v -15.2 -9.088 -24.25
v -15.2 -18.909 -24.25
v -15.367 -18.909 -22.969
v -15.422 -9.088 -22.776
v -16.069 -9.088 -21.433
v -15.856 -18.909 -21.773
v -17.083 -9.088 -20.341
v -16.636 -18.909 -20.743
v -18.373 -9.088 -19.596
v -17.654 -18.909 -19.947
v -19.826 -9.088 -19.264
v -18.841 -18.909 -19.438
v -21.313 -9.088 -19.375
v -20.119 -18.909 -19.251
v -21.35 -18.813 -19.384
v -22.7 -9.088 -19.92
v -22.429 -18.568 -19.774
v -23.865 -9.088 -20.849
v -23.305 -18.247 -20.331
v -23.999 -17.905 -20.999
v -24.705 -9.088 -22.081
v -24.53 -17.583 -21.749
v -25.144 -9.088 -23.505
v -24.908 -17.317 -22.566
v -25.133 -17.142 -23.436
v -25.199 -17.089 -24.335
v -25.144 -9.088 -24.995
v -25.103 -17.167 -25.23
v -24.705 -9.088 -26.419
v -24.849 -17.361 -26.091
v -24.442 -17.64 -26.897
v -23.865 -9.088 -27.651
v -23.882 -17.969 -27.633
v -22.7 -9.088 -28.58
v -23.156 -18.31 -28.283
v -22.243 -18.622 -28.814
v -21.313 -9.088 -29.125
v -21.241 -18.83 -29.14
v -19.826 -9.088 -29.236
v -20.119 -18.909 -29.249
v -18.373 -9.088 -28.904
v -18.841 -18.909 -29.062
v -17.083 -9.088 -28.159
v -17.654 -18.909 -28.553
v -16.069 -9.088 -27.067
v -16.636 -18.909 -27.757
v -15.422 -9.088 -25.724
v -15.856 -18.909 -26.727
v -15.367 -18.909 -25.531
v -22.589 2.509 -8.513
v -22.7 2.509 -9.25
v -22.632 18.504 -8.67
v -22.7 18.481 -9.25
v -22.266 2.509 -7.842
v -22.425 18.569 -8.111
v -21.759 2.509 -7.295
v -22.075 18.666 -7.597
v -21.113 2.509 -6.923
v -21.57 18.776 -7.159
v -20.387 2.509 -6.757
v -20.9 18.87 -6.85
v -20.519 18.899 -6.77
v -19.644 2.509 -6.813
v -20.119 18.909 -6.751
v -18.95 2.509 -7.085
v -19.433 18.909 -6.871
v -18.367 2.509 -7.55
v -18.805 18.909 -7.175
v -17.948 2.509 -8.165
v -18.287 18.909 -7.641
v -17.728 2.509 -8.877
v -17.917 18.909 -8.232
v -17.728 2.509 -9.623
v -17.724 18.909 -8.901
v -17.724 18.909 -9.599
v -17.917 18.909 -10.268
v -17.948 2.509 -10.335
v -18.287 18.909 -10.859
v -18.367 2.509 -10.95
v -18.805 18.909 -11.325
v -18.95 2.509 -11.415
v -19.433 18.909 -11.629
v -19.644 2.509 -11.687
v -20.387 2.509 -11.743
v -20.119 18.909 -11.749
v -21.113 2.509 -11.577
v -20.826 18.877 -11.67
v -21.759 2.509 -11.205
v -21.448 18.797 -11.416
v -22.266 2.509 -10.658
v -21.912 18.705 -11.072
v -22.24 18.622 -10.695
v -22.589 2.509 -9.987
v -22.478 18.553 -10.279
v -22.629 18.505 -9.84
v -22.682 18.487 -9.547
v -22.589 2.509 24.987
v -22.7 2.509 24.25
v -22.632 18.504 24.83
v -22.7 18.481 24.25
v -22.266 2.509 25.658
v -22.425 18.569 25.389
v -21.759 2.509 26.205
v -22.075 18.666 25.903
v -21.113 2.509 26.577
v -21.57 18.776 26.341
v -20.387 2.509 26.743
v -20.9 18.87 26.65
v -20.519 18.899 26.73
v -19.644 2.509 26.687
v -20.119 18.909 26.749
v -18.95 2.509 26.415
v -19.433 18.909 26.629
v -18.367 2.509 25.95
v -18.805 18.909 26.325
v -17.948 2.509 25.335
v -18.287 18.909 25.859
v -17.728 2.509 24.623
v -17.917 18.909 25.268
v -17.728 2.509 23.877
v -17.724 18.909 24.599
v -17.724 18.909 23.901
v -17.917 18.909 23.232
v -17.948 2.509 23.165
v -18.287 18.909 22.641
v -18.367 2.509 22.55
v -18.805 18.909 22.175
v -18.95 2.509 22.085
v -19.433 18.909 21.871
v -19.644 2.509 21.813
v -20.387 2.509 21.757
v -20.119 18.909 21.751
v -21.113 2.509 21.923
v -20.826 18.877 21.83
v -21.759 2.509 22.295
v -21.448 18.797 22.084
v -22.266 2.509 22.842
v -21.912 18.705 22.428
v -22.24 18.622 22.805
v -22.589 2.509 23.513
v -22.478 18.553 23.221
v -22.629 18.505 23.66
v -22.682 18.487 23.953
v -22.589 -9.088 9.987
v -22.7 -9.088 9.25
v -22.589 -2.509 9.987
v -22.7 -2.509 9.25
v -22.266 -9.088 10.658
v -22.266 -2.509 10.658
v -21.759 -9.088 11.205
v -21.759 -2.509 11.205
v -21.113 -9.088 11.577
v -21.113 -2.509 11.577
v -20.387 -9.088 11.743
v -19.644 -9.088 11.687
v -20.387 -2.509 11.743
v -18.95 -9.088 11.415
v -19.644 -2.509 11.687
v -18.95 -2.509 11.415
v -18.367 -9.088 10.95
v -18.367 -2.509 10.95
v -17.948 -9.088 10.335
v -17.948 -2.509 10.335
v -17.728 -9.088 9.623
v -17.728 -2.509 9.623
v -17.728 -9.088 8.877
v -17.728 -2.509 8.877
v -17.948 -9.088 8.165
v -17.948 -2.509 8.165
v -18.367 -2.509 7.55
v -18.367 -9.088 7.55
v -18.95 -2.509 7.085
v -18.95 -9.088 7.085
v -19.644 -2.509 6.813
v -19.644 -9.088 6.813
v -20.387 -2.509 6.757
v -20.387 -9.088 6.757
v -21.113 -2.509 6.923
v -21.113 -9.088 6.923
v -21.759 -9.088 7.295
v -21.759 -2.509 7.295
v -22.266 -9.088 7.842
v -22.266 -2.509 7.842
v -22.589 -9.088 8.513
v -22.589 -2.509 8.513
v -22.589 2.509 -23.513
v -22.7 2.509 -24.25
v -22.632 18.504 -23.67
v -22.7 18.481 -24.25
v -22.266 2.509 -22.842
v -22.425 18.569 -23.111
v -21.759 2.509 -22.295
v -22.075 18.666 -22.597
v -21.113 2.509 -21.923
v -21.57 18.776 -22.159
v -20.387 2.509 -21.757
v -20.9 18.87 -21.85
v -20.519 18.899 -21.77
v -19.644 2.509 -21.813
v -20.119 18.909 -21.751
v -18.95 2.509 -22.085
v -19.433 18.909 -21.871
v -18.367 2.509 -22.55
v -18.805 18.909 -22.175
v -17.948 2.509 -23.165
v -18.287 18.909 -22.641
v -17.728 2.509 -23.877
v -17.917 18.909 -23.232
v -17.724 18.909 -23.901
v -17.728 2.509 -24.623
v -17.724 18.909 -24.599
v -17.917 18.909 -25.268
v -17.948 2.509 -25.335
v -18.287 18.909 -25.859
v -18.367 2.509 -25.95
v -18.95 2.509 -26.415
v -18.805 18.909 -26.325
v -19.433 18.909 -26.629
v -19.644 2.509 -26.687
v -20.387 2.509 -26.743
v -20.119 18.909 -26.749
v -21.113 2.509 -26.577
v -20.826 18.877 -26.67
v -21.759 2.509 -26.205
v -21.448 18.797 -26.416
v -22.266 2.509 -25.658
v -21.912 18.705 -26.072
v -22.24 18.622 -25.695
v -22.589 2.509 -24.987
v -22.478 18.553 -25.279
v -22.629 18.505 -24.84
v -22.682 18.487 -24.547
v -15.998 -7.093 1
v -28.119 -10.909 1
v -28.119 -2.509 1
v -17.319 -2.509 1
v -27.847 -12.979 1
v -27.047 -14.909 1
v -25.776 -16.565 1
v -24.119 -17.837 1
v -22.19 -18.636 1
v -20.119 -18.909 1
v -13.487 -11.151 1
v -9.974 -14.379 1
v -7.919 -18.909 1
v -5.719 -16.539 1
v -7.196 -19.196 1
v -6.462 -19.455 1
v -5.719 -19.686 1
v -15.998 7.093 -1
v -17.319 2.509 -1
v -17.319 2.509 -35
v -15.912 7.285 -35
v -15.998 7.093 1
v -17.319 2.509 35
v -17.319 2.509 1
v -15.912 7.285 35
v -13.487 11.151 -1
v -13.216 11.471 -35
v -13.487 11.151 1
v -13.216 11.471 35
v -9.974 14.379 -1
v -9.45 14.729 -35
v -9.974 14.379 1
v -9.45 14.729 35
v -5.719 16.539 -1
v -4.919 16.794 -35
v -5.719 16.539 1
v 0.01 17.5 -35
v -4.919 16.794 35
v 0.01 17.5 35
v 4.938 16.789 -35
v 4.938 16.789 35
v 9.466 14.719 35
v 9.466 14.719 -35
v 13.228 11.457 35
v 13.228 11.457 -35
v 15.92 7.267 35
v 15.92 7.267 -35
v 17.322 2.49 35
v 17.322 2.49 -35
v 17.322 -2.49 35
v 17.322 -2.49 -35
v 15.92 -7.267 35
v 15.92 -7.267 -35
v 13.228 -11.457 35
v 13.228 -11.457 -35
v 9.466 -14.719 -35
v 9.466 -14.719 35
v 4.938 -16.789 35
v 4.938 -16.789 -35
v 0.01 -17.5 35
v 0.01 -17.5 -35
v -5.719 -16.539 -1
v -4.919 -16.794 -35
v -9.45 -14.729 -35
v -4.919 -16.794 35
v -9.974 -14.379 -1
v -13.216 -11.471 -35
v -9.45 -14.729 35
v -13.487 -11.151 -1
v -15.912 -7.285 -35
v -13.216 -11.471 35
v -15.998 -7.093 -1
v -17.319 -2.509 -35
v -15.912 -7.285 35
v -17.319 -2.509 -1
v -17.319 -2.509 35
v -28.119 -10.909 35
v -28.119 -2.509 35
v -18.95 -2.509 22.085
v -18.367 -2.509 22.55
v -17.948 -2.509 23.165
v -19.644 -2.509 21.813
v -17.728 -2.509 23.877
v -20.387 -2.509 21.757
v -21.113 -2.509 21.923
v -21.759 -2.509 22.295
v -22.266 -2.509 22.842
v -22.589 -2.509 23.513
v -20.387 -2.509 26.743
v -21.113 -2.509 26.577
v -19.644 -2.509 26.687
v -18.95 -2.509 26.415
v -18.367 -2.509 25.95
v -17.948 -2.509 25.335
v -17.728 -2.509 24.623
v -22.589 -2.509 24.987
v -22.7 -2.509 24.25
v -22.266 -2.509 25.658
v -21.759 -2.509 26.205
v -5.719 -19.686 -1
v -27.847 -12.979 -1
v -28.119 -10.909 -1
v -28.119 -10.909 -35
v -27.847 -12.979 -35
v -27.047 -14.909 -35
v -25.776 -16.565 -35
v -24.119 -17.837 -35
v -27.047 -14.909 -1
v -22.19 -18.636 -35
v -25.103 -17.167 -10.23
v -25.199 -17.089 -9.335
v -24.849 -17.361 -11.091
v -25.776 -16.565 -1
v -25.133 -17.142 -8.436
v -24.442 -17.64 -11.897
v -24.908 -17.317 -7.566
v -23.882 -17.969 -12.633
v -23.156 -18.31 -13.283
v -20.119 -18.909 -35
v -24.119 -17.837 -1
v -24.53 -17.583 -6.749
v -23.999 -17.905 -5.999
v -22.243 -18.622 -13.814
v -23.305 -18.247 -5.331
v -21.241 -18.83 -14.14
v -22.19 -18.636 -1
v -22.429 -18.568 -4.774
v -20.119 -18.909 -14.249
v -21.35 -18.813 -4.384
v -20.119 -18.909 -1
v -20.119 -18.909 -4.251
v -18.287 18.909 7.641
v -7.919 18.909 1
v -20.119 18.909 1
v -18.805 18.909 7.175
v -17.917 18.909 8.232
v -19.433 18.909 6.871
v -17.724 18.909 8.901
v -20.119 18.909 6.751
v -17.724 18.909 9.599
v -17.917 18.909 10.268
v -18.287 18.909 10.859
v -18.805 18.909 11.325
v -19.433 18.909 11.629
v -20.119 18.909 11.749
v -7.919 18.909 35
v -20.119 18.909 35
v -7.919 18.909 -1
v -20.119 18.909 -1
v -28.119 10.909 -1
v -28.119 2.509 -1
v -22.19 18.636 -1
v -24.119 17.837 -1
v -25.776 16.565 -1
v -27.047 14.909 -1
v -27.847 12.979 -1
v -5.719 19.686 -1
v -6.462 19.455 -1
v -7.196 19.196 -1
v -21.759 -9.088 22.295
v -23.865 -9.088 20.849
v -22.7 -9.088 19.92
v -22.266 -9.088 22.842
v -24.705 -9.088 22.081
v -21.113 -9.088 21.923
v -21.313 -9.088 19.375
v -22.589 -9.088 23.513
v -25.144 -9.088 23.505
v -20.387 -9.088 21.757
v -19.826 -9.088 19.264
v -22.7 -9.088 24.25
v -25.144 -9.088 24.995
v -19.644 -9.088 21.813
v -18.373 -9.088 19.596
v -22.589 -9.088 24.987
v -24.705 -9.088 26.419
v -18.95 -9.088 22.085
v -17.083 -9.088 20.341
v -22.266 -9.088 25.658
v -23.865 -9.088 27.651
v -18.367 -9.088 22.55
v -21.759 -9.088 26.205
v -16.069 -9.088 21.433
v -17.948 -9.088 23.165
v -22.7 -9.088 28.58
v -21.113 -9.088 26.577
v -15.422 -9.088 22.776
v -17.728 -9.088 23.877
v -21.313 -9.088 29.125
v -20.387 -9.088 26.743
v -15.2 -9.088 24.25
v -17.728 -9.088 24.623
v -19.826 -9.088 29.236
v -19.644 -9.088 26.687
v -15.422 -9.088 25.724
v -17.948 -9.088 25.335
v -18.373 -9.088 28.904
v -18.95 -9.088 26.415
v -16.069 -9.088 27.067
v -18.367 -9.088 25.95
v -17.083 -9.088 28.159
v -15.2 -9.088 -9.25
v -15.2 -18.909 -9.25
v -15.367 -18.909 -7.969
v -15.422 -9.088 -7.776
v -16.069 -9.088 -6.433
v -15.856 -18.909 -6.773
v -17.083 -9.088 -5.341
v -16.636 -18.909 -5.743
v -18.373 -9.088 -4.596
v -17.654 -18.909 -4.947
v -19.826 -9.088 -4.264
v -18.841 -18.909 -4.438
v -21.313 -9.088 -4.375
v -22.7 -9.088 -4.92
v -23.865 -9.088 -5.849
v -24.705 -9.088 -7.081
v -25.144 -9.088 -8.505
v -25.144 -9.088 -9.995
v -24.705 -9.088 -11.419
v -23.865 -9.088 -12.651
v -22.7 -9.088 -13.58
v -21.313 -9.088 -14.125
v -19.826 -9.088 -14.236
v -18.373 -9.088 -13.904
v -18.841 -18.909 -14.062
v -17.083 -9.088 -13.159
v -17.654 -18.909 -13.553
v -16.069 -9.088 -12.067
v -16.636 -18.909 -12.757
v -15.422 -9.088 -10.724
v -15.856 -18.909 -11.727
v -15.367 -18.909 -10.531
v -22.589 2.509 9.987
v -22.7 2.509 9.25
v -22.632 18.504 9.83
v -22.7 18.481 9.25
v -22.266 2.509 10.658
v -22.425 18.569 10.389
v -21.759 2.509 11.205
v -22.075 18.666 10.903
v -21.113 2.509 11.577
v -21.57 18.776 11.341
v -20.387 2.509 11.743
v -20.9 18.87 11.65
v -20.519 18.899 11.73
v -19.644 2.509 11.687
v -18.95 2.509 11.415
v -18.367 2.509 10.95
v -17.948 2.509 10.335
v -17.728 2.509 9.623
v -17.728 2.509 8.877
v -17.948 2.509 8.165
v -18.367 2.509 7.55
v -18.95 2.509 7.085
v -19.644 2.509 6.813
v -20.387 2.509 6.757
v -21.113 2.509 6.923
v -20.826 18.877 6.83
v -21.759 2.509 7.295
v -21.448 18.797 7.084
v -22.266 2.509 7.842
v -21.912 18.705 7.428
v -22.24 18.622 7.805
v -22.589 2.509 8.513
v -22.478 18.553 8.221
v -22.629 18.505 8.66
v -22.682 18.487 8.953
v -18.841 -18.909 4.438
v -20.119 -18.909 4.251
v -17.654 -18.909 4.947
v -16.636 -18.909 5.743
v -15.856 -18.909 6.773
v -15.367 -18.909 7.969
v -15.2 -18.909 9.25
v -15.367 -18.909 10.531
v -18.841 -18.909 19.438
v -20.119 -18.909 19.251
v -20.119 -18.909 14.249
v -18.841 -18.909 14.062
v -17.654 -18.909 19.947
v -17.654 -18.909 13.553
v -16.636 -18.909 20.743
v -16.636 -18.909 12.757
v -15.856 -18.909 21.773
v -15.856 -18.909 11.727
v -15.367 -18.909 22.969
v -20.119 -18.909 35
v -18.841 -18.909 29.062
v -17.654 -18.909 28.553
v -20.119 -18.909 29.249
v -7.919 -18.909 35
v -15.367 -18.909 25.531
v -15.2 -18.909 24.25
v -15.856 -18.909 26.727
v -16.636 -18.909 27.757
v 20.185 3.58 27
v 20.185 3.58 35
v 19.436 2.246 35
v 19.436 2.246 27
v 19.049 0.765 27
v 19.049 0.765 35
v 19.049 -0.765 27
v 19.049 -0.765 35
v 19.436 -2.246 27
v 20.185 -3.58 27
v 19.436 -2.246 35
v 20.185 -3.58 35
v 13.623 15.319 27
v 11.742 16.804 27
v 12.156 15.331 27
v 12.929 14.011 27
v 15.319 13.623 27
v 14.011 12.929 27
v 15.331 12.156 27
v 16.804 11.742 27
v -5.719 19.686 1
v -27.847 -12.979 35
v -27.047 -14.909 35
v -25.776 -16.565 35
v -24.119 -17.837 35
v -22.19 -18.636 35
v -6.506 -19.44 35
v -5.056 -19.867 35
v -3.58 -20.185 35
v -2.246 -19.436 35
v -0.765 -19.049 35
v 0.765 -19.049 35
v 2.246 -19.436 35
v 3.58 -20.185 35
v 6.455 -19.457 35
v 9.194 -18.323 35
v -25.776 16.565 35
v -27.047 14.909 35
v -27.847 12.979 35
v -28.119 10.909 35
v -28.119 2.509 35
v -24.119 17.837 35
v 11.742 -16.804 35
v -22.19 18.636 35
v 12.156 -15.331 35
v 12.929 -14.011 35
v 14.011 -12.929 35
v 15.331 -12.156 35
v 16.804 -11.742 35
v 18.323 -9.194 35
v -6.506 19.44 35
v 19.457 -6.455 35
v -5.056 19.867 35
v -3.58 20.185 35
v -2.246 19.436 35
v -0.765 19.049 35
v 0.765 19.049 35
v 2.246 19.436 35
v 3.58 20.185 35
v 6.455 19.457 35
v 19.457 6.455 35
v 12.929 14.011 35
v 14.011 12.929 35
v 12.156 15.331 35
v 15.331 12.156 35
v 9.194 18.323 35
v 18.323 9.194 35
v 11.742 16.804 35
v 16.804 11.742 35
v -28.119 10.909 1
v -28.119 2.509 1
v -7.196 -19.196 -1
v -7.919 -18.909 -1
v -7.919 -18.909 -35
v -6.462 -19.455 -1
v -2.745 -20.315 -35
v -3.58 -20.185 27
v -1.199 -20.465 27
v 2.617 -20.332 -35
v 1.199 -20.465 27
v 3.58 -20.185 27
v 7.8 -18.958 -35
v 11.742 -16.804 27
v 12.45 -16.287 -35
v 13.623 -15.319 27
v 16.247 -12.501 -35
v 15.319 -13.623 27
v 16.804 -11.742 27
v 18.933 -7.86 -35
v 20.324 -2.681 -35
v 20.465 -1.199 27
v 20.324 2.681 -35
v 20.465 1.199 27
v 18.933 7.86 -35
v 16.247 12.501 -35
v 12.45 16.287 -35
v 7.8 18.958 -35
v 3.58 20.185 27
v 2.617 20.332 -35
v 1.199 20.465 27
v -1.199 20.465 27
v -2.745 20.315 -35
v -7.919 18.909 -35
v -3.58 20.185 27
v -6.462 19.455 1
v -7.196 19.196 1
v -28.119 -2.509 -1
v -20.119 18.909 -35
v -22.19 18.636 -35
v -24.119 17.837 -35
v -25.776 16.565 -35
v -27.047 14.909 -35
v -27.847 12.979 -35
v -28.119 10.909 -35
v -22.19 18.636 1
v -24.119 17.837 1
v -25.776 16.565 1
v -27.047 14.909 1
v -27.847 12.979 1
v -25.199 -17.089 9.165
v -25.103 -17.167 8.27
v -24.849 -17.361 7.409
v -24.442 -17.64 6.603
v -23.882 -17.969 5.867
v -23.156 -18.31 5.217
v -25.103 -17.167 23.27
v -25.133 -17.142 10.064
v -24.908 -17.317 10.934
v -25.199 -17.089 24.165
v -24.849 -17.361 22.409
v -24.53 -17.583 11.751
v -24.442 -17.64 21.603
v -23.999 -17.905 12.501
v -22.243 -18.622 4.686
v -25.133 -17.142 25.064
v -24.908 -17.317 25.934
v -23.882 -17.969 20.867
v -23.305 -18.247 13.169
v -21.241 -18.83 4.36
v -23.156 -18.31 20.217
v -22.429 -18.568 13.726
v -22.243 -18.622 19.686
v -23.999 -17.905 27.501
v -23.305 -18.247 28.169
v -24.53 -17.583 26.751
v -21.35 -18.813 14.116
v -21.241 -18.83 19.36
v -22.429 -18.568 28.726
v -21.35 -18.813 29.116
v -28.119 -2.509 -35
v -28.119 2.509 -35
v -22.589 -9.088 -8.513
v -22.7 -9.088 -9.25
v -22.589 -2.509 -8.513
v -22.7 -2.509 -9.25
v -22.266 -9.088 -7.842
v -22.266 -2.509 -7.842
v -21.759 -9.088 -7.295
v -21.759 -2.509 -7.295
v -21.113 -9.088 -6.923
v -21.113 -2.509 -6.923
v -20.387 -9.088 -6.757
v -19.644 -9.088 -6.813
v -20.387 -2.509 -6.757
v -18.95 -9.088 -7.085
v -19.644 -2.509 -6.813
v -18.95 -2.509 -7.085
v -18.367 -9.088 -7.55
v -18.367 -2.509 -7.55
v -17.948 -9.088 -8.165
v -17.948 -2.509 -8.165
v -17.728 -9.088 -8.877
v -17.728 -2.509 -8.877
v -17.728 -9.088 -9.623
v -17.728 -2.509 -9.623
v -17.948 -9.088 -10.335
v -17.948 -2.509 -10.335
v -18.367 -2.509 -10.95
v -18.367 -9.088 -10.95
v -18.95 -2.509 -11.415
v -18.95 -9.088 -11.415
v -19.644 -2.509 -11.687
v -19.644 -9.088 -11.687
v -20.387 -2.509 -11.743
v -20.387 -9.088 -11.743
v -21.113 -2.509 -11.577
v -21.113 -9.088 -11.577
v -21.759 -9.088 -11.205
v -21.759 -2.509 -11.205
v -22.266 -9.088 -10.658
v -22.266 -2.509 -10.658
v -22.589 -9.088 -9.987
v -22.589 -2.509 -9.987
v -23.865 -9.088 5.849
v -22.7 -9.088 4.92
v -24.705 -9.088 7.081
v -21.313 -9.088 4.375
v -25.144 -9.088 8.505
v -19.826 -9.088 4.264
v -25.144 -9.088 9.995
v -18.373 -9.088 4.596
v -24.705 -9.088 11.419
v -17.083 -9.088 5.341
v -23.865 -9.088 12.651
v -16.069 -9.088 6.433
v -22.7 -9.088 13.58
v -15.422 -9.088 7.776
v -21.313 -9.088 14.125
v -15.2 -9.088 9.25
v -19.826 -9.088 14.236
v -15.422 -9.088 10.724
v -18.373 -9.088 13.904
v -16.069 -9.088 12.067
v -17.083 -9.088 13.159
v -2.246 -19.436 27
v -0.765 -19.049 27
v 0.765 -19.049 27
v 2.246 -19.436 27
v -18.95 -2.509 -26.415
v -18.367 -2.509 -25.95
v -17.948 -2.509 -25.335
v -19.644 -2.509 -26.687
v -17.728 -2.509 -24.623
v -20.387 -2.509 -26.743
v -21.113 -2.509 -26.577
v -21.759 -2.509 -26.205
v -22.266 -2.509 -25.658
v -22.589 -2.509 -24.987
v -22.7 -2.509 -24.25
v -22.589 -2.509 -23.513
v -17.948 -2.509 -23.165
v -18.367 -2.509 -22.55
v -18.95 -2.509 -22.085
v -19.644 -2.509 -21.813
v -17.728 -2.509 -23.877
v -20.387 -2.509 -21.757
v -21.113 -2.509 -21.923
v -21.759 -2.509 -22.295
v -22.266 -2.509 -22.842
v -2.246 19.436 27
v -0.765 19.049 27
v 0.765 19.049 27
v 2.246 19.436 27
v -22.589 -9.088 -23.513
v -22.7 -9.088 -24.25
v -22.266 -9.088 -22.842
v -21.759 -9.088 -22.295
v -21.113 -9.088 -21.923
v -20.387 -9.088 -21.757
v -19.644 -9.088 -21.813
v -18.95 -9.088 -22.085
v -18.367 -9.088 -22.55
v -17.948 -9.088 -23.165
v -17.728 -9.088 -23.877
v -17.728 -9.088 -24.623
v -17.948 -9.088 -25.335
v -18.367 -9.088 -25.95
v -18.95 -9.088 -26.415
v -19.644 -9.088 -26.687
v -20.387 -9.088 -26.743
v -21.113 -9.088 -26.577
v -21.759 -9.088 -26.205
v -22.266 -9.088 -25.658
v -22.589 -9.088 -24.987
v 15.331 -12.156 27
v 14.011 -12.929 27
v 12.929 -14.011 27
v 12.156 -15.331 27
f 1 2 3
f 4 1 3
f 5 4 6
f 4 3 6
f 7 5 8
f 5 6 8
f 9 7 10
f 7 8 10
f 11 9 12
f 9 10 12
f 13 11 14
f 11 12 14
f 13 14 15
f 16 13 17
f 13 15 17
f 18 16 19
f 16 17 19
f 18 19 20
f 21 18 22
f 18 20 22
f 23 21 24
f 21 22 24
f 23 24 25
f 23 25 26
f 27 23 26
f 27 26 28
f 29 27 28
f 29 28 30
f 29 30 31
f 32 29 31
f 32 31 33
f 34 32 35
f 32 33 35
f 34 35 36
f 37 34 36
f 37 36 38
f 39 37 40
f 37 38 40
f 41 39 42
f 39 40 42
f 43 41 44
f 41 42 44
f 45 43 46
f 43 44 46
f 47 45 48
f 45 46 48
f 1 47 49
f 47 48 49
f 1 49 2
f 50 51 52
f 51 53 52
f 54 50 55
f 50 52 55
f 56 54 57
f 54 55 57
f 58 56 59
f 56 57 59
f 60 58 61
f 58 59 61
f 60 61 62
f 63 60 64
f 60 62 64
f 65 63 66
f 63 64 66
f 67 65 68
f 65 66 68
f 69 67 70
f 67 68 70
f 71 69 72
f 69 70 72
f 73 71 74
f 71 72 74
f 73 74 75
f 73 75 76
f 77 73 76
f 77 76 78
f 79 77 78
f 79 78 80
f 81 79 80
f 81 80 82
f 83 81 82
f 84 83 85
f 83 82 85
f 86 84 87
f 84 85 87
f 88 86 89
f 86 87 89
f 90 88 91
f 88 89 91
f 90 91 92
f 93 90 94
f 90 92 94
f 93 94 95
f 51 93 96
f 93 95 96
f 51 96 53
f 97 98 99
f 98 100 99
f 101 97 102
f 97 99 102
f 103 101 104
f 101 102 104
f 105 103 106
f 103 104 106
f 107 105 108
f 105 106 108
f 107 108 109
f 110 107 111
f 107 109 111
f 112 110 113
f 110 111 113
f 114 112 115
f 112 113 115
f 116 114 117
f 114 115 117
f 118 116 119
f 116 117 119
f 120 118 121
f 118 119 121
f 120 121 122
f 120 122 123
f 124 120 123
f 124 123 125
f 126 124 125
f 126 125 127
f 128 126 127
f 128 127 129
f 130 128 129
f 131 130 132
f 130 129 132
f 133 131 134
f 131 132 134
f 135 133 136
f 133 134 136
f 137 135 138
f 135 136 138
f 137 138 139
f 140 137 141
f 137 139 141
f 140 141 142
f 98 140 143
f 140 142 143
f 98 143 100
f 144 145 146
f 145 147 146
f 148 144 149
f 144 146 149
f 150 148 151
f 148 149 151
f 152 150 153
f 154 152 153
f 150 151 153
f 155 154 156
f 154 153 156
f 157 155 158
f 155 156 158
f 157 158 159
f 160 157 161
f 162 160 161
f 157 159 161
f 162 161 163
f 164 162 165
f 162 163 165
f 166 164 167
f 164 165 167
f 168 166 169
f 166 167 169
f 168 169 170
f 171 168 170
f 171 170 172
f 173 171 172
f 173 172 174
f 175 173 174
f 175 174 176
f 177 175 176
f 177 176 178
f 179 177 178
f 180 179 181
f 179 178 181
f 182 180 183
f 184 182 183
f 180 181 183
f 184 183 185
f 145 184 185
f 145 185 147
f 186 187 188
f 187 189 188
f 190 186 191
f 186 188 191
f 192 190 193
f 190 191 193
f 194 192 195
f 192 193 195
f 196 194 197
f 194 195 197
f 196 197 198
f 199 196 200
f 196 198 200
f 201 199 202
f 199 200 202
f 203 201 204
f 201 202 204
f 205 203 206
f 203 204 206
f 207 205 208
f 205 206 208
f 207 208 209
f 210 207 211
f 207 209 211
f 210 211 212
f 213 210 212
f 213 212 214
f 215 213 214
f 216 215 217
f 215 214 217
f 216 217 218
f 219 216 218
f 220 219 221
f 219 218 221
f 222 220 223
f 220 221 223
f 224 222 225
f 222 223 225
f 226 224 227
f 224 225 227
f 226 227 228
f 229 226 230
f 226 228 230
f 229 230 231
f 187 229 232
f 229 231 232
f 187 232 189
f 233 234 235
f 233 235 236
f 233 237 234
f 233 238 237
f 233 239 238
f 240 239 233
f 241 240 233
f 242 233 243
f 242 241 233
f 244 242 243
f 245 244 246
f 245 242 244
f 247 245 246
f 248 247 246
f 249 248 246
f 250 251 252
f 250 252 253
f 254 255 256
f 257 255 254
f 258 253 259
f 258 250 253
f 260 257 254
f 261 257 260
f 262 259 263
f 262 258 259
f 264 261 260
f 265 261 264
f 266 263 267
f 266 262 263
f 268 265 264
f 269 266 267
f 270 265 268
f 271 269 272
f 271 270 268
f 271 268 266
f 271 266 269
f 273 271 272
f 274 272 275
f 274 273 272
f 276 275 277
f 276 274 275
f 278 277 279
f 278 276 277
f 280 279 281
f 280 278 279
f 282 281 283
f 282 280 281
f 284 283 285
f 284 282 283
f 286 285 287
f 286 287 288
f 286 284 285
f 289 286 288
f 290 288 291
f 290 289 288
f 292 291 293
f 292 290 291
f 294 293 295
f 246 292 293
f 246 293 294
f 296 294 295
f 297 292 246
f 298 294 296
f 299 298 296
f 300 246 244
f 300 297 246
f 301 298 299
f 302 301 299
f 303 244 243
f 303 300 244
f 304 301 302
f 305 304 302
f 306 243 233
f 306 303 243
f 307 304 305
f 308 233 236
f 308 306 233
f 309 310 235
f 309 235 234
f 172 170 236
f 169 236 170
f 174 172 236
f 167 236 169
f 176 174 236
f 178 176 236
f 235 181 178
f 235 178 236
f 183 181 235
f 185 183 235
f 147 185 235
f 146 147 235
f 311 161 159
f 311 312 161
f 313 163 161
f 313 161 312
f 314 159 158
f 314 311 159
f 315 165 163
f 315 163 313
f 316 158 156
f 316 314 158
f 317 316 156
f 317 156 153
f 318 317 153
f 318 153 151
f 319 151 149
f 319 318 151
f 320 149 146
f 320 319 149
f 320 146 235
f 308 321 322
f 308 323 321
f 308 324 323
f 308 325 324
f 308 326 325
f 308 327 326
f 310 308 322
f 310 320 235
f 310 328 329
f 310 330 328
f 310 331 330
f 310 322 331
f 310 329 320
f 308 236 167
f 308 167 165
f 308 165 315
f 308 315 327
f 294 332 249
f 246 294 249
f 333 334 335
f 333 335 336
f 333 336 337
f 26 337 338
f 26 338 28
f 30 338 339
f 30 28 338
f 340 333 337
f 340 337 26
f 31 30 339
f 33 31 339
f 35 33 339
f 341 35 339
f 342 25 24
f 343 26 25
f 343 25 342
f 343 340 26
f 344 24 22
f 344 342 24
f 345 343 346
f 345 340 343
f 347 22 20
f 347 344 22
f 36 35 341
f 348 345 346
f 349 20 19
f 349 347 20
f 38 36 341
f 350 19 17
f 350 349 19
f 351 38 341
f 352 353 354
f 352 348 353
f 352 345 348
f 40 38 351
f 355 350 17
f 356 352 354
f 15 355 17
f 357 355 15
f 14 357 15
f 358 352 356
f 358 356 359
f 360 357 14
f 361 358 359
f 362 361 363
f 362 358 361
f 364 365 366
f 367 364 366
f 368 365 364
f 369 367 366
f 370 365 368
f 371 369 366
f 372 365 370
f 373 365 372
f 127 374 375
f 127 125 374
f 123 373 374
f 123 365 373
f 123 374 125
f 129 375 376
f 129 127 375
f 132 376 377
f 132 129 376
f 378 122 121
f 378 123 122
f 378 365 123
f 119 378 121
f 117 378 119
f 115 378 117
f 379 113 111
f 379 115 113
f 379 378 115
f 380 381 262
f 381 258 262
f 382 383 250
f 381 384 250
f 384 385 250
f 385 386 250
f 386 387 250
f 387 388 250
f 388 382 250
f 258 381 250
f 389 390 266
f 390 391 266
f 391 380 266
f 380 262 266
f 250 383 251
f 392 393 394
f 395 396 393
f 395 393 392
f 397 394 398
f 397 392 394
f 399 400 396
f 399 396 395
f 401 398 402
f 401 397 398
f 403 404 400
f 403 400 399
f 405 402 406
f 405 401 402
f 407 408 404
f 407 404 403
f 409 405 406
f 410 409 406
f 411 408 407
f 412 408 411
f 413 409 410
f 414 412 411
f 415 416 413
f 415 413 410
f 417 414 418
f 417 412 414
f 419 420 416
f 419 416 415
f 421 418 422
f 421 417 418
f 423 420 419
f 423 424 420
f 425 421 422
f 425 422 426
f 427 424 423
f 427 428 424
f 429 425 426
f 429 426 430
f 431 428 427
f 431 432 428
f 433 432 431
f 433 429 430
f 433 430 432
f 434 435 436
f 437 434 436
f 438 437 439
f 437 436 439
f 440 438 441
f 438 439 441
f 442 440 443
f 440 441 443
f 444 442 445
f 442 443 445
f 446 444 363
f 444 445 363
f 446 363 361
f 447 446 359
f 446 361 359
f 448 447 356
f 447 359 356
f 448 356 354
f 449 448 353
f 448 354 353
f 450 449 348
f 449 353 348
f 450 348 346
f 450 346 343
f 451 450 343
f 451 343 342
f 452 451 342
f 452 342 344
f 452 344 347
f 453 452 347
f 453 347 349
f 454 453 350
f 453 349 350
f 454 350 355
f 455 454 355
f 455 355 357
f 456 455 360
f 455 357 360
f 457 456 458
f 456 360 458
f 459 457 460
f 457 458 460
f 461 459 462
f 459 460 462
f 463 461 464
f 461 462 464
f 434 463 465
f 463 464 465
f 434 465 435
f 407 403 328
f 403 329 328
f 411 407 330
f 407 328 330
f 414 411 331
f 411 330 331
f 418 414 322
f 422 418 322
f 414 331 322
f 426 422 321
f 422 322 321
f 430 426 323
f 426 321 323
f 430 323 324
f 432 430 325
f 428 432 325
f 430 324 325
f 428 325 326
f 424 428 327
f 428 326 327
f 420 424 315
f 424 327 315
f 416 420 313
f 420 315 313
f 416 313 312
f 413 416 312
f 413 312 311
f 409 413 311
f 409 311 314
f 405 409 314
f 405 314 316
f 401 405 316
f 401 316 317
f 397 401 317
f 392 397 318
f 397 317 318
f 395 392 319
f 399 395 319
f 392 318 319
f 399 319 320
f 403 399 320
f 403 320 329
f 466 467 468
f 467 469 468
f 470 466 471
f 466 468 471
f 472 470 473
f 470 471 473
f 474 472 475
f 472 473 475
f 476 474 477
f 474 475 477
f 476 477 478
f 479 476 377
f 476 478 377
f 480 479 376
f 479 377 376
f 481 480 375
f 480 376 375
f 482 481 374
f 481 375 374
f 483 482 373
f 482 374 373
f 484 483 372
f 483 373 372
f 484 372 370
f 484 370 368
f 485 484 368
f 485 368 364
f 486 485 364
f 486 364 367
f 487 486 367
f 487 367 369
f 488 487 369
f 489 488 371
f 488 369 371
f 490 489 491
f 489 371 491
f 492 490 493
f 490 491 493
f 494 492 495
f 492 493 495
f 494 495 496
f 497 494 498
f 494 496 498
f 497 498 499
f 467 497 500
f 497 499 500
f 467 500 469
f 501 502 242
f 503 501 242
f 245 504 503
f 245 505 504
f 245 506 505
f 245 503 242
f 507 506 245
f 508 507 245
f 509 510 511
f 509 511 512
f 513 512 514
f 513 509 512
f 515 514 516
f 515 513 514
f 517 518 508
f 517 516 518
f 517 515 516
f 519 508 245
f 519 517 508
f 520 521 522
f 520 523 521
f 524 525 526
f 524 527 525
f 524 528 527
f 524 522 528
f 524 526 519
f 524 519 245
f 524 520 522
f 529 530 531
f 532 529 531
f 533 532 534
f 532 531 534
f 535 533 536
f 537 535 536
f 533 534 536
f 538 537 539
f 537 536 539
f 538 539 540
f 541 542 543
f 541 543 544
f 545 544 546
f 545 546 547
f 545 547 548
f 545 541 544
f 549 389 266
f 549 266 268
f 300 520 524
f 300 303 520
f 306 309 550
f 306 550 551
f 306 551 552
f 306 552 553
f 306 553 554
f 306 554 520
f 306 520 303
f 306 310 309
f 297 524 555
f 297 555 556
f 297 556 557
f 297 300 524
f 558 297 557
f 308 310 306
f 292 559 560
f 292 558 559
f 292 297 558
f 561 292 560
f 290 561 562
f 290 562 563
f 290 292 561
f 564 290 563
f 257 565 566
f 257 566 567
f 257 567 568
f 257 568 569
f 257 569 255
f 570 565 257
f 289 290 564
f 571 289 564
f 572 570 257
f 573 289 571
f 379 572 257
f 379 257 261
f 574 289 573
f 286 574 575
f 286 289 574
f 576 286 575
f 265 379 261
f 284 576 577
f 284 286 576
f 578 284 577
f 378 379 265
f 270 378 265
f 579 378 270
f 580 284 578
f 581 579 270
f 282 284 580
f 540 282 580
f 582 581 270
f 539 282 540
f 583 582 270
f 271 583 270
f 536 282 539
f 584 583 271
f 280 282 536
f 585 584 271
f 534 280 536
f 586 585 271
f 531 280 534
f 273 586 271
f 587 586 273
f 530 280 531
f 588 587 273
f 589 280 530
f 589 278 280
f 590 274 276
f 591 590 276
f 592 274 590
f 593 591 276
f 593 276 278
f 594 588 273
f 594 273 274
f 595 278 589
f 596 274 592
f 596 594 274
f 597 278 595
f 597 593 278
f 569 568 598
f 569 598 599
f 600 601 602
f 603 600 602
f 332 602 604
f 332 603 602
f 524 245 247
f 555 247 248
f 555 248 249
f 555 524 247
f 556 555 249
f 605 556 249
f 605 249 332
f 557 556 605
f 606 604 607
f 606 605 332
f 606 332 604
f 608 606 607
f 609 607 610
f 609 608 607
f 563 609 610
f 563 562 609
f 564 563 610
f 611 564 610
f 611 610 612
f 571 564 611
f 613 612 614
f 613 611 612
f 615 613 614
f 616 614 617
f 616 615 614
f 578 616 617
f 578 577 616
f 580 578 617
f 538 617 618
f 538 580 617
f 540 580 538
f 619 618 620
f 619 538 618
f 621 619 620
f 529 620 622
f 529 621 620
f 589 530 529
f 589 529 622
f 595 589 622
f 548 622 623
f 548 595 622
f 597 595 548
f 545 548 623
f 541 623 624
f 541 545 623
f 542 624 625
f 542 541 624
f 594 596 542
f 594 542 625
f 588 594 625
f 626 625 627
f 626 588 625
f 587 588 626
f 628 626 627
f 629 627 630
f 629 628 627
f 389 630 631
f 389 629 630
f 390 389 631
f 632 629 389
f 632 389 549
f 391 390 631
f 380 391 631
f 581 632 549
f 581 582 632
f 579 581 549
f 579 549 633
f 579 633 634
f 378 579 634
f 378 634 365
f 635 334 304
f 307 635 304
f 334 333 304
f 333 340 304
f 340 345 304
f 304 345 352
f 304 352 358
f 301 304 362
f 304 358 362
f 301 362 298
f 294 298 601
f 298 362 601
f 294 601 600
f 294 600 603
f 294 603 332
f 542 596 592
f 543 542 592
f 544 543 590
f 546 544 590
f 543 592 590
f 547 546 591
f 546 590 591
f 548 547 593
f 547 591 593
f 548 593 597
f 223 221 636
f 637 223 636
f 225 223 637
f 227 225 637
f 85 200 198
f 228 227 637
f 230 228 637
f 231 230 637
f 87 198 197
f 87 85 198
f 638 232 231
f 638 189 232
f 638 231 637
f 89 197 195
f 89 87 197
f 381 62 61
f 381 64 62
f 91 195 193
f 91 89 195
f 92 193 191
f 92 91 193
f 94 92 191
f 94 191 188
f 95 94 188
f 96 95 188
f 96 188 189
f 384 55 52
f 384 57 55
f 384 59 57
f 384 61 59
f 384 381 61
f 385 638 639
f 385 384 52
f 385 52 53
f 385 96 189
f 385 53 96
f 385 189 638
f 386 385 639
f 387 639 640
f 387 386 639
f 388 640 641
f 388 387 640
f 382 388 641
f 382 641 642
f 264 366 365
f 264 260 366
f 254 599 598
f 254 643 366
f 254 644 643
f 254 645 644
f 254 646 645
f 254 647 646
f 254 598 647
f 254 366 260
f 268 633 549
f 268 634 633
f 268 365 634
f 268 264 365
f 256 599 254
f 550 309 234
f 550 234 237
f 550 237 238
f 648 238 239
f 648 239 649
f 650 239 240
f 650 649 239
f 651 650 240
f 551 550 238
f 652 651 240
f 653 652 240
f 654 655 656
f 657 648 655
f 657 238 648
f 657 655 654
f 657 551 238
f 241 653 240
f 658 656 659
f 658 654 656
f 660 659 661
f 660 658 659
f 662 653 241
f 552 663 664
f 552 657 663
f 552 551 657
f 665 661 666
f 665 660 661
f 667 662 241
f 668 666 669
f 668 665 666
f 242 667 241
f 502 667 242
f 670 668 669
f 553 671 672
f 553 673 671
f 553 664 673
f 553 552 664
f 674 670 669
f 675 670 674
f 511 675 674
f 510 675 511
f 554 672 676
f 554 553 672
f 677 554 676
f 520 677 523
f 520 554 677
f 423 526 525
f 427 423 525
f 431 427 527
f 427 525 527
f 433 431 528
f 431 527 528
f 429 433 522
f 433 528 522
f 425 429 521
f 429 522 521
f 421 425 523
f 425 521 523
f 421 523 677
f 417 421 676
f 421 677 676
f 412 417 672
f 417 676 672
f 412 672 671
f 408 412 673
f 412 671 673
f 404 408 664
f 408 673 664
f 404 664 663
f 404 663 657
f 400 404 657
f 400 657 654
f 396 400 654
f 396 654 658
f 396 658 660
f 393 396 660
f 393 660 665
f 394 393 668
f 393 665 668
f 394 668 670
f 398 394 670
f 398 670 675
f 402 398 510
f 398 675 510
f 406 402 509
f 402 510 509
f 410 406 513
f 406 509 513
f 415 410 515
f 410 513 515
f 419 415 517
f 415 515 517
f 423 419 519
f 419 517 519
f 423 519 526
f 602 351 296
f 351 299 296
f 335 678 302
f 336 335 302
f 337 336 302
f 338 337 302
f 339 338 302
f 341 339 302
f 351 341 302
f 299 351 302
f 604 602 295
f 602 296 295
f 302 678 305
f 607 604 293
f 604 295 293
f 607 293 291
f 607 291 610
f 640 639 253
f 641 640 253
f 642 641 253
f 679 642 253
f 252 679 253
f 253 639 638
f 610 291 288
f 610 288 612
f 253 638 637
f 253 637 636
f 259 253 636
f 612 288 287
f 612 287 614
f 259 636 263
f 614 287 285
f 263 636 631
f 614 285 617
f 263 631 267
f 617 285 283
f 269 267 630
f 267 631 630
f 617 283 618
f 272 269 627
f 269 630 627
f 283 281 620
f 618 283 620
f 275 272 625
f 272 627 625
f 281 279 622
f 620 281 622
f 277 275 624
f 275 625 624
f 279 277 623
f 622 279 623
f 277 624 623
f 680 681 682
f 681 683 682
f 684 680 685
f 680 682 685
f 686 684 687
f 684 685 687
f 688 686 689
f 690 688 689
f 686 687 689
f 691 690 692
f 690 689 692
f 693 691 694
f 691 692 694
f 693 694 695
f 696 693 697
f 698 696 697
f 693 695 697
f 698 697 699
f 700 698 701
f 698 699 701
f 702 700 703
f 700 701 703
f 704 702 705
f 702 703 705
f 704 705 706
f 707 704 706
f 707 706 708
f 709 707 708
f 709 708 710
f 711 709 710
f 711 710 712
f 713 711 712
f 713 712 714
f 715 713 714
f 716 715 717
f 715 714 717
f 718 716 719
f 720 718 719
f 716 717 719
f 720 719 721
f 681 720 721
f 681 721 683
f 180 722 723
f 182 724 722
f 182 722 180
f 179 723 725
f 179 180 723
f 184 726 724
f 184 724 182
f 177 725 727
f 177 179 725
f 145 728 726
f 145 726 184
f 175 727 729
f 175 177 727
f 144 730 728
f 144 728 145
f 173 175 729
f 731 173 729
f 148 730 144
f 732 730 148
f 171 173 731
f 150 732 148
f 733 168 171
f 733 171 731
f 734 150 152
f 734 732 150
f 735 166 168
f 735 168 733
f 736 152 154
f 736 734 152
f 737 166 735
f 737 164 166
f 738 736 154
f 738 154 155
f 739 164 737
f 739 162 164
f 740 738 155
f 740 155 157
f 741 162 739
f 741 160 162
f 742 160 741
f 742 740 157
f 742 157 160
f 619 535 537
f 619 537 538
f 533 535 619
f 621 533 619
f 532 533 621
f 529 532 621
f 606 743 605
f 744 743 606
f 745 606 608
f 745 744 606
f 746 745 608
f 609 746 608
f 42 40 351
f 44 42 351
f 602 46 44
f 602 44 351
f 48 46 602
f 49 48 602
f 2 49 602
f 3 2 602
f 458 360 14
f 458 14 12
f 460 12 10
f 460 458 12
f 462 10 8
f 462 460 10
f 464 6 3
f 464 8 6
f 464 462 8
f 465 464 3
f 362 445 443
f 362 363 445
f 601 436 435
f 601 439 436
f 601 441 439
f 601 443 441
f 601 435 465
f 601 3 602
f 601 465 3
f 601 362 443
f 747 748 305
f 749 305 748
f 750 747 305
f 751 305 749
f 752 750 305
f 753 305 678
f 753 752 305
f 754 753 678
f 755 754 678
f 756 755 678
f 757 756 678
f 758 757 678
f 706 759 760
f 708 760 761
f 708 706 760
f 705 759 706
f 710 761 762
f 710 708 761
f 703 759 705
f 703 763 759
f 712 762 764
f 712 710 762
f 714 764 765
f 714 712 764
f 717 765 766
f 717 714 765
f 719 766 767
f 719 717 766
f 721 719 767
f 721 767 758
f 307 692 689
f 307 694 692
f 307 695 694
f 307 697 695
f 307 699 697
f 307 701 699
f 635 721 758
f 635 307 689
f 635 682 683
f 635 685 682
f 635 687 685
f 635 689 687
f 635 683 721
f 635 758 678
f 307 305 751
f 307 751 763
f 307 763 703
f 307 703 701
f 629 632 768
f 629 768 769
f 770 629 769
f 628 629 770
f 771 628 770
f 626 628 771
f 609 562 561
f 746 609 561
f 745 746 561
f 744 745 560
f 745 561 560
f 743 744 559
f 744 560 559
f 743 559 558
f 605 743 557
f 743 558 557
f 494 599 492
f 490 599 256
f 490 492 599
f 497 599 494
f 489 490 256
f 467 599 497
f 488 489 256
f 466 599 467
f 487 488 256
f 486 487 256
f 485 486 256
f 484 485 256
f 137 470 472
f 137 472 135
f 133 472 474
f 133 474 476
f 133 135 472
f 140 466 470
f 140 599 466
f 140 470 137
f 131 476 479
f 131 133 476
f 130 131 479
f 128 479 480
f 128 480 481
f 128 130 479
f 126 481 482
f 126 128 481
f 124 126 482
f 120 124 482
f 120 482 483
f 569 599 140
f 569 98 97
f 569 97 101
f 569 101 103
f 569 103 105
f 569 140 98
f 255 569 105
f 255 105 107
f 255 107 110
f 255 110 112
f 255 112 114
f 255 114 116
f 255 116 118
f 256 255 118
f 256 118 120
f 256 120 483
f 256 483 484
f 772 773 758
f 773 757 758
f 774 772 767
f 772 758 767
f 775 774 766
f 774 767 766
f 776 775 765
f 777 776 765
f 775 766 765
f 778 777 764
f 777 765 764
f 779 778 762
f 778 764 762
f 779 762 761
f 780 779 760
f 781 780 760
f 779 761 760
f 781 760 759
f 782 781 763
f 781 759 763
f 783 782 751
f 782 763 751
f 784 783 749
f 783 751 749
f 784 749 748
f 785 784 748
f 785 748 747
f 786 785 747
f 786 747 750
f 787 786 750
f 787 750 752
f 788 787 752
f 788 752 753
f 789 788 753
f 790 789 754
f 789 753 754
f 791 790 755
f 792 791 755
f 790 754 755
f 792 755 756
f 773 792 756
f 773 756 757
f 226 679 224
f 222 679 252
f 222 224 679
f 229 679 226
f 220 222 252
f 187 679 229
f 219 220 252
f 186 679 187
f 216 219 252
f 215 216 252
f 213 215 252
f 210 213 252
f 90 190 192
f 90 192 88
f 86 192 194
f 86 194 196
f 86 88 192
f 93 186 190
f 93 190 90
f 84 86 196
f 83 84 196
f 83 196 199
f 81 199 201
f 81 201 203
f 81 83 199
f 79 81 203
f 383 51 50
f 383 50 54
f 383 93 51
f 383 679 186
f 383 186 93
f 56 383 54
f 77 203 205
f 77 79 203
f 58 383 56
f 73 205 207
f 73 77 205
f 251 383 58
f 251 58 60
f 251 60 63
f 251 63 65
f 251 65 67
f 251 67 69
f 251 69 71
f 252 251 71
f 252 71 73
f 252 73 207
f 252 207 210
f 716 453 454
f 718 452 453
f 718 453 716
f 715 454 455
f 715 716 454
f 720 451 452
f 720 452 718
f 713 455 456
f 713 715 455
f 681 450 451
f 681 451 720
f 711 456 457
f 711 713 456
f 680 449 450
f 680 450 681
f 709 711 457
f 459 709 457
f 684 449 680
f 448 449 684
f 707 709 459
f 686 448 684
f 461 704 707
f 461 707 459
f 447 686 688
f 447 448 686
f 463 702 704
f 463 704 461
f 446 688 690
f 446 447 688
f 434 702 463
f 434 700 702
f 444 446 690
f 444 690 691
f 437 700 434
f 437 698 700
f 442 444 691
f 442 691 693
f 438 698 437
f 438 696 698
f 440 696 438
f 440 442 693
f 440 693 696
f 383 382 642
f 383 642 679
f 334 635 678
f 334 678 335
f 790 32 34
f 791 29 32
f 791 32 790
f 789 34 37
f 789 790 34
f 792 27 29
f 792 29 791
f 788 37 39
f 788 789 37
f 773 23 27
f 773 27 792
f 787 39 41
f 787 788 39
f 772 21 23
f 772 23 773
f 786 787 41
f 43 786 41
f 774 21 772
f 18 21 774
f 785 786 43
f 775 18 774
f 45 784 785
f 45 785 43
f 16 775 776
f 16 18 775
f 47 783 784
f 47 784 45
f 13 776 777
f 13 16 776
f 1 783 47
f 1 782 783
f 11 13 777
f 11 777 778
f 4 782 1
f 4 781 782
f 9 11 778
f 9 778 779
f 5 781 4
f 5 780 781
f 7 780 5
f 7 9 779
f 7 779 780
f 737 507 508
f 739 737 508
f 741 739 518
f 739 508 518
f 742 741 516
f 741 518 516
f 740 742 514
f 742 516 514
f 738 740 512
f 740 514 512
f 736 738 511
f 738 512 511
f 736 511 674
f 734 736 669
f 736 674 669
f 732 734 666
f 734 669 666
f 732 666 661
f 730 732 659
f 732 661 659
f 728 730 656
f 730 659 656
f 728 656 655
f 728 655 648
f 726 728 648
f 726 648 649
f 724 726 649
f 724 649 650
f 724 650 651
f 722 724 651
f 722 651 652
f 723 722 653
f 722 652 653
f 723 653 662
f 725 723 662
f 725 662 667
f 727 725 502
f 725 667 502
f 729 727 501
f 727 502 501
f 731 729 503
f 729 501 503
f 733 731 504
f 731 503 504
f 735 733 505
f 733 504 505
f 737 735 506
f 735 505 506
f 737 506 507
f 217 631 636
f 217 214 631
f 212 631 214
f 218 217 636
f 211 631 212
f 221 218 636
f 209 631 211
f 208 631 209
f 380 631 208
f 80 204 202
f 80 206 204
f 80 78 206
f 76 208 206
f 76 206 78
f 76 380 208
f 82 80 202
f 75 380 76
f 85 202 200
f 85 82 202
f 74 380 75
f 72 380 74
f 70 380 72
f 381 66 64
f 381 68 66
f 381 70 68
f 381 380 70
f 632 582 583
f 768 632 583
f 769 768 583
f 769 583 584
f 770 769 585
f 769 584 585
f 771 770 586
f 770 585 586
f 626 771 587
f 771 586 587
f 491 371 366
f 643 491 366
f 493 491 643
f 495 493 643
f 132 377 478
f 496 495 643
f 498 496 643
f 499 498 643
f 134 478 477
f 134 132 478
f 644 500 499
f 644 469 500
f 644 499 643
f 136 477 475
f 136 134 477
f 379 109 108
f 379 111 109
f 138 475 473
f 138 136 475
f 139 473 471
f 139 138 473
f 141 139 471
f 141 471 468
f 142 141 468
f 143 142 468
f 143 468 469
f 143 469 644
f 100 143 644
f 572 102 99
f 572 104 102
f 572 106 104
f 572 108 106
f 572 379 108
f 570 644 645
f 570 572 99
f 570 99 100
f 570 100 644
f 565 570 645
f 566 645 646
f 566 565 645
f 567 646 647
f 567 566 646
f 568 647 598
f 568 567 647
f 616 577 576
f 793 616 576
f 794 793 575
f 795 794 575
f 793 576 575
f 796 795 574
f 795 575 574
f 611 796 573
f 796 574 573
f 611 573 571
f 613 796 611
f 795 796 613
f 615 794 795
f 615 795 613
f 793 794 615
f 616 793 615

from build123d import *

# Parameters (mm, degrees)
F1_DEPTH       = 35
F3_D           = 5
F3_START       = 1.8205079
F3_CBORE_D     = 10
F3_CBORE_DEPTH = 8
F4_W           = 22.4
F4_H           = 2
F5_DEPTH       = 25
F6_R           = 6
F7_DEPTH       = 8


with BuildPart() as f1:
    # F0 (on Top) → F1 (new body, symmetric)
    with BuildSketch(Plane.XY):
        with BuildLine():
            Line((-20.1192642082, -18.9086026559), (-7.9192642082, -18.9086026559))
            ThreePointArc((-7.9192642082, -18.9086026559), (20.5, 0), (-7.9192642082, 18.9086026559))
            Line((-7.9192642082, 18.9086026559), (-20.1192642082, 18.9086026559))
            ThreePointArc((-20.1192642082, 18.9086026559), (-25.7761184577, 16.5654569054), (-28.1192642082, 10.9086026559))
            Line((-28.1192642082, 10.9086026559), (-28.1192642082, 2.5086026559))
            Line((-28.1192642082, 2.5086026559), (-17.3192642082, 2.5086026559))
            ThreePointArc((-17.3192642082, 2.5086026559), (17.5, 0), (-17.3192642082, -2.5086026559))
            Line((-17.3192642082, -2.5086026559), (-28.1192642082, -2.5086026559))
            Line((-28.1192642082, -2.5086026559), (-28.1192642082, -10.9086026559))
            ThreePointArc((-28.1192642082, -10.9086026559), (-25.7761184577, -16.5654569054), (-20.1192642082, -18.9086026559))
        make_face()
    extrude(amount=F1_DEPTH, both=True)

    # F3 (through all)
    # its depths count from where the whole tool has entered the part; down to there all is cleared
    with Locations(Plane.XZ.offset(18.9086026559).offset(-F3_START)):
        with Locations((-20.2, -24.25), (-20.2, -9.25), (-20.2, 9.25), (-20.2, 24.25)):
            CounterBoreHole(F3_D / 2, F3_CBORE_D / 2, F3_CBORE_DEPTH)

    # F4 (on Front) → F5 (cut, symmetric)
    with BuildSketch(Plane.XZ):
        with Locations((-16.9192642082, 0)):
            Rectangle(F4_W, F4_H)
    extrude(amount=F5_DEPTH, both=True, mode=Mode.SUBTRACT)

    # F6 (on face) → F7 (cut)
    with BuildSketch(Plane.XY.offset(35)):
        with Locations((0, -25)):
            Circle(F6_R)
        with Locations((17.6776695297, -17.6776695297)):
            Circle(F6_R)
        with Locations((25, 0)):
            Circle(F6_R)
        with Locations((17.6776695297, 17.6776695297)):
            Circle(F6_R)
        with Locations((0, 25)):
            Circle(F6_R)
    extrude(amount=-F7_DEPTH, mode=Mode.SUBTRACT)


solid = f1.part
